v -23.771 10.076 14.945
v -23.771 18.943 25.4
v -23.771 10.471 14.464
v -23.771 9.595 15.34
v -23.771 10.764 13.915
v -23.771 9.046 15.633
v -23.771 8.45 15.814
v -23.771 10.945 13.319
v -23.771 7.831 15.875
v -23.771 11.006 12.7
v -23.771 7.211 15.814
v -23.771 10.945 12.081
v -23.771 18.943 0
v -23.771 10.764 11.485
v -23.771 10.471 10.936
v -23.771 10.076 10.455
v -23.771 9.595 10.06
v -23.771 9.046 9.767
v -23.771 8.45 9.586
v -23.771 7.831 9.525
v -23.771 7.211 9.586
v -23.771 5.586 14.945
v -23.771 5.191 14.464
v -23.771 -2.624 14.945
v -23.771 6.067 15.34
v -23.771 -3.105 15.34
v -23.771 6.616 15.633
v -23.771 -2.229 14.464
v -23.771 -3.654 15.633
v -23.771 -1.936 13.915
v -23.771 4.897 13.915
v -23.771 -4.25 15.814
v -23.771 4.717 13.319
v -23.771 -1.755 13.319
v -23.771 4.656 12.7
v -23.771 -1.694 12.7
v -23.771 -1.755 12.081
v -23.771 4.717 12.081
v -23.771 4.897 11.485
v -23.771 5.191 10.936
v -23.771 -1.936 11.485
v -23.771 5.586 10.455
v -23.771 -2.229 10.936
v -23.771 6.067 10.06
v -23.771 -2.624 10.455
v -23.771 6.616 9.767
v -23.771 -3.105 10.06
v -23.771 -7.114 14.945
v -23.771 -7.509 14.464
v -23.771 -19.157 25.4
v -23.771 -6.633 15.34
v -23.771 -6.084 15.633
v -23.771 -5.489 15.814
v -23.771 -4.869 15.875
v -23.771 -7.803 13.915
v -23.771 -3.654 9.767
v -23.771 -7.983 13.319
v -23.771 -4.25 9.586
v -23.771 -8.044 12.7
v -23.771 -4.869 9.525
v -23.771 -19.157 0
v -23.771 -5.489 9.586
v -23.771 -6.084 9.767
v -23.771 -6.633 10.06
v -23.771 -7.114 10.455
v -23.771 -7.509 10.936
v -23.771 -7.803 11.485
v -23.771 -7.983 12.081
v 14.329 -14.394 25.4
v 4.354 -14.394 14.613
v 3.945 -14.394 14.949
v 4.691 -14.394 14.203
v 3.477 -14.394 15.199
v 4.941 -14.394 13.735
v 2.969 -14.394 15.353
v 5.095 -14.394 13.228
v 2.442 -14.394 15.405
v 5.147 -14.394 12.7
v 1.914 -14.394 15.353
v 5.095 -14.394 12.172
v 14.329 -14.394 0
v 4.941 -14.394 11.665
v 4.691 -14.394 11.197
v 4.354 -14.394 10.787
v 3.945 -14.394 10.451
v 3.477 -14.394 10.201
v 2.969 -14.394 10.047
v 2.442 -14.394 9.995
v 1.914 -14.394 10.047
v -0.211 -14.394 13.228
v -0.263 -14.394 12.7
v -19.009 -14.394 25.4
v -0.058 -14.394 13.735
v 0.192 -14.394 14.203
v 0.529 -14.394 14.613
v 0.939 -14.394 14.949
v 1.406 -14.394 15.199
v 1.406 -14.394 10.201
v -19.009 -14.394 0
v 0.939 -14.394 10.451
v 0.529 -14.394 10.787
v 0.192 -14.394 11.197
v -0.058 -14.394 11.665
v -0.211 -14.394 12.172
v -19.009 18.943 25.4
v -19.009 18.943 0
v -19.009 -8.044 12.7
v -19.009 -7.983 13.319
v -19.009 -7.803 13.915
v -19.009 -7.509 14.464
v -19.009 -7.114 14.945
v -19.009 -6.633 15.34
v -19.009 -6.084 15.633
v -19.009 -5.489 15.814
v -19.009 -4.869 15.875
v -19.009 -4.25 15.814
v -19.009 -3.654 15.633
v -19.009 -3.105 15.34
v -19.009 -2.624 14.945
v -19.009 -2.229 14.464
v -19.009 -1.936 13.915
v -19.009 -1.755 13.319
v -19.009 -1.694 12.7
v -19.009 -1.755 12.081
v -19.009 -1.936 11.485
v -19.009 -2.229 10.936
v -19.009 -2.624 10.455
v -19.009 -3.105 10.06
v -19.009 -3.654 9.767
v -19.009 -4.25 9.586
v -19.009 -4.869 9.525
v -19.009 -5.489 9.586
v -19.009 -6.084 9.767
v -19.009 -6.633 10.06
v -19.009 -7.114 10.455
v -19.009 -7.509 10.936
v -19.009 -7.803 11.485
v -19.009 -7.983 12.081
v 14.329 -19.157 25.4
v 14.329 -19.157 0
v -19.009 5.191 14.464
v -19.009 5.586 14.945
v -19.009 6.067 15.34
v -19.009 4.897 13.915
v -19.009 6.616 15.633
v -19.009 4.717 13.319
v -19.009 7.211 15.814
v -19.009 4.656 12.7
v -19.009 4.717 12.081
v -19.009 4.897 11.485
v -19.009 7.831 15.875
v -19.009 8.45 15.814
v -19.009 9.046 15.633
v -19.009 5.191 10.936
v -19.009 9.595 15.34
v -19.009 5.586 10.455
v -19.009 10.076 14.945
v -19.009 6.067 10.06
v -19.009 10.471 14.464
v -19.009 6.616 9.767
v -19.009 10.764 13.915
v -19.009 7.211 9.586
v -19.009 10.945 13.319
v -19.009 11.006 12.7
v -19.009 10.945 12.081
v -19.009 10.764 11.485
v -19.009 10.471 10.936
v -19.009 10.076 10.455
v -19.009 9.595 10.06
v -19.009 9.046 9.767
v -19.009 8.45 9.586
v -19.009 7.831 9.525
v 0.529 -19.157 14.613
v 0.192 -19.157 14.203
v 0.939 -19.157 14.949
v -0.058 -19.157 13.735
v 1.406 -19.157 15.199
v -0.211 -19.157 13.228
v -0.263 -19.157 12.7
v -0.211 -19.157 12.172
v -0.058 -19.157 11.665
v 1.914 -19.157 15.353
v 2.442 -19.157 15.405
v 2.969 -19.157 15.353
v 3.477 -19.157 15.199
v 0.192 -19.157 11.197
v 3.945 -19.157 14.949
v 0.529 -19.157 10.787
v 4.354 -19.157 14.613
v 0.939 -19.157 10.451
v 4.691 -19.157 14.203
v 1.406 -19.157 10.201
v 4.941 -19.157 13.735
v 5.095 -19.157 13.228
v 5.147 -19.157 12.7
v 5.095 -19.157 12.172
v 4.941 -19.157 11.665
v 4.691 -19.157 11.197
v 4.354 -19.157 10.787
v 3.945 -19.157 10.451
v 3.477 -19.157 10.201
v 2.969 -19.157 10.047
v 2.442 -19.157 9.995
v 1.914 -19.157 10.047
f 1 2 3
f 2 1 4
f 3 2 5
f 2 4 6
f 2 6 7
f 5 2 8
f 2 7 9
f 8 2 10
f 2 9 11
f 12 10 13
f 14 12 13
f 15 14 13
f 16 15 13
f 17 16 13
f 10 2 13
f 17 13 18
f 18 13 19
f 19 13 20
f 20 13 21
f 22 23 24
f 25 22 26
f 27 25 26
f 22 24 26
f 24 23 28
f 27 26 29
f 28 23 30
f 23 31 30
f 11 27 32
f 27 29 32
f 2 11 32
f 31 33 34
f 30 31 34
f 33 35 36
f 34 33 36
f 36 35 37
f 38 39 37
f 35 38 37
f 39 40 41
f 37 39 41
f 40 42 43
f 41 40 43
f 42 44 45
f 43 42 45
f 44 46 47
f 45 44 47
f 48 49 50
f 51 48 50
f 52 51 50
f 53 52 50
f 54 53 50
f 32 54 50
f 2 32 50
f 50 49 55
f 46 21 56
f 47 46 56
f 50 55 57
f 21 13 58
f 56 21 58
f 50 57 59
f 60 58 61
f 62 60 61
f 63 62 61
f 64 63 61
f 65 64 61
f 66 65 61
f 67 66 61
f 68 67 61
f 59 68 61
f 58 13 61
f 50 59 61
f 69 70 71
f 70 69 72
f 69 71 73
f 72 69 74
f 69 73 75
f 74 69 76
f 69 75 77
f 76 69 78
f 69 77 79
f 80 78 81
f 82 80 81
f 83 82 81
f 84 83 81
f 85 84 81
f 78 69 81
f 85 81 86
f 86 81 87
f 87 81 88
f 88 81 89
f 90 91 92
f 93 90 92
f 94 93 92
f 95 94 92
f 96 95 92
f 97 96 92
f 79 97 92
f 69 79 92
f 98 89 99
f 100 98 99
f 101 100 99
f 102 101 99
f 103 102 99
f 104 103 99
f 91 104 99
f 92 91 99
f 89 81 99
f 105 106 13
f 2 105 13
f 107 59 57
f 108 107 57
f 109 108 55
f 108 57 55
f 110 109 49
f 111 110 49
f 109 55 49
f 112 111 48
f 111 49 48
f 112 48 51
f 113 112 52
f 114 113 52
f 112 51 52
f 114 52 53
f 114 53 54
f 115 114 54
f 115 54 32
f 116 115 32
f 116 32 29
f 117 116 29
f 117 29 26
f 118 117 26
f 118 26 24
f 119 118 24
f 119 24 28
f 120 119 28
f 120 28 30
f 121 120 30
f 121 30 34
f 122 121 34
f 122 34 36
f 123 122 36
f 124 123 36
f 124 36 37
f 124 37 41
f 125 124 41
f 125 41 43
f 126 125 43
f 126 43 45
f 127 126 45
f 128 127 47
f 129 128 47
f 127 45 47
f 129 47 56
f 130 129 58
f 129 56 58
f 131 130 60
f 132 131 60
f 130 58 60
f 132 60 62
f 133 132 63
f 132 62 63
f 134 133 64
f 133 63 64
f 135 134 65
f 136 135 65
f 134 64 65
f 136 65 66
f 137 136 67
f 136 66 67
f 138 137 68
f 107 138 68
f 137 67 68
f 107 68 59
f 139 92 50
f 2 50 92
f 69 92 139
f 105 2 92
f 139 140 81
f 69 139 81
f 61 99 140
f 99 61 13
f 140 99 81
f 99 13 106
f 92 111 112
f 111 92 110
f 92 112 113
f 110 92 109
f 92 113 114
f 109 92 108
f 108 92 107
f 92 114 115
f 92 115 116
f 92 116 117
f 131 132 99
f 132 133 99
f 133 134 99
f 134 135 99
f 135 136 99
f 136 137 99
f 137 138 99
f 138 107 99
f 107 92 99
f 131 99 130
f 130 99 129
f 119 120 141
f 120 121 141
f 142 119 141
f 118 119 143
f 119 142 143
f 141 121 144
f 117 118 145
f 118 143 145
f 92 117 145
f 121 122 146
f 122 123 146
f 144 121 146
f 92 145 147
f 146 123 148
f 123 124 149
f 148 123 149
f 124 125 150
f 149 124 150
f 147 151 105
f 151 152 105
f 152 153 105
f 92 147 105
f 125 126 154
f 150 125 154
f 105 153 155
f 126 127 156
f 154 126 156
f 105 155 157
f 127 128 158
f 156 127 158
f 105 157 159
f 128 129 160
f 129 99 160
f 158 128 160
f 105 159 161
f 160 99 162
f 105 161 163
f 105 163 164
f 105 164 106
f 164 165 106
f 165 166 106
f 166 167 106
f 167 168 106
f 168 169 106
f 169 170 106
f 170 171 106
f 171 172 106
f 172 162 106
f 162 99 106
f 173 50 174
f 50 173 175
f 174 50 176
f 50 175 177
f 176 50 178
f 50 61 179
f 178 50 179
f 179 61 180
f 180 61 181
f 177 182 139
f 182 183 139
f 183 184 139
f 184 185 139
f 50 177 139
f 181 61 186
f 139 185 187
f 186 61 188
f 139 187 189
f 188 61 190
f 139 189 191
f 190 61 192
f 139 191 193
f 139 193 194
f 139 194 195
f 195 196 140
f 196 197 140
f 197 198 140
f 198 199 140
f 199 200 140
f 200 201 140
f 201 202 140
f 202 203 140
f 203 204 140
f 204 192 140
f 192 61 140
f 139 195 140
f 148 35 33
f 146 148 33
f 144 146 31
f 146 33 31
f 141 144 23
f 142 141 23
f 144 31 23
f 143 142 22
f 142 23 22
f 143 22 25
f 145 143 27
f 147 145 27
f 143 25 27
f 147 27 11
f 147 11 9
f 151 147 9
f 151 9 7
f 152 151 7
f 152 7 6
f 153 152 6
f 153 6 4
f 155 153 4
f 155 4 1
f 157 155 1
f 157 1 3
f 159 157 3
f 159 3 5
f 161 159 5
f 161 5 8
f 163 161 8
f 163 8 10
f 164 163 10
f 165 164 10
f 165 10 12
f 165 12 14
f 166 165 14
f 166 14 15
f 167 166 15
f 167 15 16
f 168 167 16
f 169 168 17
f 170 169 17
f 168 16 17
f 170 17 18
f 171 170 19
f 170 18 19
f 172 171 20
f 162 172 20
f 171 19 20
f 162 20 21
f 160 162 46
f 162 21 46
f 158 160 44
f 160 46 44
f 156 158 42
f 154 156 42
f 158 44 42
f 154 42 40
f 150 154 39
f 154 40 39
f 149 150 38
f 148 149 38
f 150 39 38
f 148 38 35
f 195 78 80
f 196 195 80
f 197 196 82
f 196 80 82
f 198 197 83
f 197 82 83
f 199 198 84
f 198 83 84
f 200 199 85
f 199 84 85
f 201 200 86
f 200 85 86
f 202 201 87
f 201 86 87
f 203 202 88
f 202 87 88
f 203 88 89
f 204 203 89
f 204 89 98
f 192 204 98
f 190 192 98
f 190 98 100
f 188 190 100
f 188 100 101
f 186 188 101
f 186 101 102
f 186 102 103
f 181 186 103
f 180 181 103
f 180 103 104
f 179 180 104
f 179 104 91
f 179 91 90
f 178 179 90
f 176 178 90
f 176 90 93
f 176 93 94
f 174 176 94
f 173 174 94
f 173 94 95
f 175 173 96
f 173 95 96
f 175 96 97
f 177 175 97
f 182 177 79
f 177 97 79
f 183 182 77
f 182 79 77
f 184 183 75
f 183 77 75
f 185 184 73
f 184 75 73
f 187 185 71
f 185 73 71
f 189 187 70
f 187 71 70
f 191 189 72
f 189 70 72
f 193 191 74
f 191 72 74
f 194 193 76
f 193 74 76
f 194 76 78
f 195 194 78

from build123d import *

# Parameters (mm, degrees)
BOSS_EXTRUDE1_DEPTH     = 25.4
CUT_EXTRUDE1_REACH      = 51.636
SKETCH2_R               = 3.175
F_1_4_28_TAPPED_HOLE1_D = 5.4102


with BuildPart() as part:
    # Sketch1 → Boss-Extrude1 (new body)
    with BuildSketch(Plane.XY):
        Polygon((-23.771121012, 18.943273067), (-23.771121012, -19.156726933), (14.328878988, -19.156726933), (14.328878988, -14.394226933), (-19.008621012, -14.394226933), (-19.008621012, 18.943273067), align=None)
    extrude(amount=BOSS_EXTRUDE1_DEPTH)

    # Sketch2 → Cut-Extrude1 (cut, up to next)
    with BuildSketch(Plane.ZY.offset(23.771121012), mode=Mode.PRIVATE) as cut_extrude1_sk1:
        with Locations(Location((12.7, 7.830773067, 0), (0, 0, 270))):
            Circle(SKETCH2_R)
    cut_extrude1_tool1 = extrude(cut_extrude1_sk1.sketch, amount=-CUT_EXTRUDE1_REACH, mode=Mode.PRIVATE) & part.part
    # Sketch2 → Cut-Extrude1 (cut, up to next)
    with BuildSketch(Plane.ZY.offset(23.771121012), mode=Mode.PRIVATE) as cut_extrude1_sk2:
        with Locations(Location((12.7, -4.869226933, 0), (0, 0, 270))):
            Circle(SKETCH2_R)
    cut_extrude1_tool2 = extrude(cut_extrude1_sk2.sketch, amount=-CUT_EXTRUDE1_REACH, mode=Mode.PRIVATE) & part.part
    add(cut_extrude1_tool1.solids().sort_by_distance((-23.771121, 7.830773, 12.7))[0], mode=Mode.SUBTRACT)
    add(cut_extrude1_tool2.solids().sort_by_distance((-23.771121, -4.869227, 12.7))[0], mode=Mode.SUBTRACT)

    # 1/4-28 Tapped Hole1 (through all)
    with Locations(Plane(origin=(0, -19.156726933, 0), x_dir=(-1, 0, 0), z_dir=(0, -1, 0))):
        with Locations((-2.441678988, -12.7)):
            Hole(F_1_4_28_TAPPED_HOLE1_D / 2)


solid = part.part
